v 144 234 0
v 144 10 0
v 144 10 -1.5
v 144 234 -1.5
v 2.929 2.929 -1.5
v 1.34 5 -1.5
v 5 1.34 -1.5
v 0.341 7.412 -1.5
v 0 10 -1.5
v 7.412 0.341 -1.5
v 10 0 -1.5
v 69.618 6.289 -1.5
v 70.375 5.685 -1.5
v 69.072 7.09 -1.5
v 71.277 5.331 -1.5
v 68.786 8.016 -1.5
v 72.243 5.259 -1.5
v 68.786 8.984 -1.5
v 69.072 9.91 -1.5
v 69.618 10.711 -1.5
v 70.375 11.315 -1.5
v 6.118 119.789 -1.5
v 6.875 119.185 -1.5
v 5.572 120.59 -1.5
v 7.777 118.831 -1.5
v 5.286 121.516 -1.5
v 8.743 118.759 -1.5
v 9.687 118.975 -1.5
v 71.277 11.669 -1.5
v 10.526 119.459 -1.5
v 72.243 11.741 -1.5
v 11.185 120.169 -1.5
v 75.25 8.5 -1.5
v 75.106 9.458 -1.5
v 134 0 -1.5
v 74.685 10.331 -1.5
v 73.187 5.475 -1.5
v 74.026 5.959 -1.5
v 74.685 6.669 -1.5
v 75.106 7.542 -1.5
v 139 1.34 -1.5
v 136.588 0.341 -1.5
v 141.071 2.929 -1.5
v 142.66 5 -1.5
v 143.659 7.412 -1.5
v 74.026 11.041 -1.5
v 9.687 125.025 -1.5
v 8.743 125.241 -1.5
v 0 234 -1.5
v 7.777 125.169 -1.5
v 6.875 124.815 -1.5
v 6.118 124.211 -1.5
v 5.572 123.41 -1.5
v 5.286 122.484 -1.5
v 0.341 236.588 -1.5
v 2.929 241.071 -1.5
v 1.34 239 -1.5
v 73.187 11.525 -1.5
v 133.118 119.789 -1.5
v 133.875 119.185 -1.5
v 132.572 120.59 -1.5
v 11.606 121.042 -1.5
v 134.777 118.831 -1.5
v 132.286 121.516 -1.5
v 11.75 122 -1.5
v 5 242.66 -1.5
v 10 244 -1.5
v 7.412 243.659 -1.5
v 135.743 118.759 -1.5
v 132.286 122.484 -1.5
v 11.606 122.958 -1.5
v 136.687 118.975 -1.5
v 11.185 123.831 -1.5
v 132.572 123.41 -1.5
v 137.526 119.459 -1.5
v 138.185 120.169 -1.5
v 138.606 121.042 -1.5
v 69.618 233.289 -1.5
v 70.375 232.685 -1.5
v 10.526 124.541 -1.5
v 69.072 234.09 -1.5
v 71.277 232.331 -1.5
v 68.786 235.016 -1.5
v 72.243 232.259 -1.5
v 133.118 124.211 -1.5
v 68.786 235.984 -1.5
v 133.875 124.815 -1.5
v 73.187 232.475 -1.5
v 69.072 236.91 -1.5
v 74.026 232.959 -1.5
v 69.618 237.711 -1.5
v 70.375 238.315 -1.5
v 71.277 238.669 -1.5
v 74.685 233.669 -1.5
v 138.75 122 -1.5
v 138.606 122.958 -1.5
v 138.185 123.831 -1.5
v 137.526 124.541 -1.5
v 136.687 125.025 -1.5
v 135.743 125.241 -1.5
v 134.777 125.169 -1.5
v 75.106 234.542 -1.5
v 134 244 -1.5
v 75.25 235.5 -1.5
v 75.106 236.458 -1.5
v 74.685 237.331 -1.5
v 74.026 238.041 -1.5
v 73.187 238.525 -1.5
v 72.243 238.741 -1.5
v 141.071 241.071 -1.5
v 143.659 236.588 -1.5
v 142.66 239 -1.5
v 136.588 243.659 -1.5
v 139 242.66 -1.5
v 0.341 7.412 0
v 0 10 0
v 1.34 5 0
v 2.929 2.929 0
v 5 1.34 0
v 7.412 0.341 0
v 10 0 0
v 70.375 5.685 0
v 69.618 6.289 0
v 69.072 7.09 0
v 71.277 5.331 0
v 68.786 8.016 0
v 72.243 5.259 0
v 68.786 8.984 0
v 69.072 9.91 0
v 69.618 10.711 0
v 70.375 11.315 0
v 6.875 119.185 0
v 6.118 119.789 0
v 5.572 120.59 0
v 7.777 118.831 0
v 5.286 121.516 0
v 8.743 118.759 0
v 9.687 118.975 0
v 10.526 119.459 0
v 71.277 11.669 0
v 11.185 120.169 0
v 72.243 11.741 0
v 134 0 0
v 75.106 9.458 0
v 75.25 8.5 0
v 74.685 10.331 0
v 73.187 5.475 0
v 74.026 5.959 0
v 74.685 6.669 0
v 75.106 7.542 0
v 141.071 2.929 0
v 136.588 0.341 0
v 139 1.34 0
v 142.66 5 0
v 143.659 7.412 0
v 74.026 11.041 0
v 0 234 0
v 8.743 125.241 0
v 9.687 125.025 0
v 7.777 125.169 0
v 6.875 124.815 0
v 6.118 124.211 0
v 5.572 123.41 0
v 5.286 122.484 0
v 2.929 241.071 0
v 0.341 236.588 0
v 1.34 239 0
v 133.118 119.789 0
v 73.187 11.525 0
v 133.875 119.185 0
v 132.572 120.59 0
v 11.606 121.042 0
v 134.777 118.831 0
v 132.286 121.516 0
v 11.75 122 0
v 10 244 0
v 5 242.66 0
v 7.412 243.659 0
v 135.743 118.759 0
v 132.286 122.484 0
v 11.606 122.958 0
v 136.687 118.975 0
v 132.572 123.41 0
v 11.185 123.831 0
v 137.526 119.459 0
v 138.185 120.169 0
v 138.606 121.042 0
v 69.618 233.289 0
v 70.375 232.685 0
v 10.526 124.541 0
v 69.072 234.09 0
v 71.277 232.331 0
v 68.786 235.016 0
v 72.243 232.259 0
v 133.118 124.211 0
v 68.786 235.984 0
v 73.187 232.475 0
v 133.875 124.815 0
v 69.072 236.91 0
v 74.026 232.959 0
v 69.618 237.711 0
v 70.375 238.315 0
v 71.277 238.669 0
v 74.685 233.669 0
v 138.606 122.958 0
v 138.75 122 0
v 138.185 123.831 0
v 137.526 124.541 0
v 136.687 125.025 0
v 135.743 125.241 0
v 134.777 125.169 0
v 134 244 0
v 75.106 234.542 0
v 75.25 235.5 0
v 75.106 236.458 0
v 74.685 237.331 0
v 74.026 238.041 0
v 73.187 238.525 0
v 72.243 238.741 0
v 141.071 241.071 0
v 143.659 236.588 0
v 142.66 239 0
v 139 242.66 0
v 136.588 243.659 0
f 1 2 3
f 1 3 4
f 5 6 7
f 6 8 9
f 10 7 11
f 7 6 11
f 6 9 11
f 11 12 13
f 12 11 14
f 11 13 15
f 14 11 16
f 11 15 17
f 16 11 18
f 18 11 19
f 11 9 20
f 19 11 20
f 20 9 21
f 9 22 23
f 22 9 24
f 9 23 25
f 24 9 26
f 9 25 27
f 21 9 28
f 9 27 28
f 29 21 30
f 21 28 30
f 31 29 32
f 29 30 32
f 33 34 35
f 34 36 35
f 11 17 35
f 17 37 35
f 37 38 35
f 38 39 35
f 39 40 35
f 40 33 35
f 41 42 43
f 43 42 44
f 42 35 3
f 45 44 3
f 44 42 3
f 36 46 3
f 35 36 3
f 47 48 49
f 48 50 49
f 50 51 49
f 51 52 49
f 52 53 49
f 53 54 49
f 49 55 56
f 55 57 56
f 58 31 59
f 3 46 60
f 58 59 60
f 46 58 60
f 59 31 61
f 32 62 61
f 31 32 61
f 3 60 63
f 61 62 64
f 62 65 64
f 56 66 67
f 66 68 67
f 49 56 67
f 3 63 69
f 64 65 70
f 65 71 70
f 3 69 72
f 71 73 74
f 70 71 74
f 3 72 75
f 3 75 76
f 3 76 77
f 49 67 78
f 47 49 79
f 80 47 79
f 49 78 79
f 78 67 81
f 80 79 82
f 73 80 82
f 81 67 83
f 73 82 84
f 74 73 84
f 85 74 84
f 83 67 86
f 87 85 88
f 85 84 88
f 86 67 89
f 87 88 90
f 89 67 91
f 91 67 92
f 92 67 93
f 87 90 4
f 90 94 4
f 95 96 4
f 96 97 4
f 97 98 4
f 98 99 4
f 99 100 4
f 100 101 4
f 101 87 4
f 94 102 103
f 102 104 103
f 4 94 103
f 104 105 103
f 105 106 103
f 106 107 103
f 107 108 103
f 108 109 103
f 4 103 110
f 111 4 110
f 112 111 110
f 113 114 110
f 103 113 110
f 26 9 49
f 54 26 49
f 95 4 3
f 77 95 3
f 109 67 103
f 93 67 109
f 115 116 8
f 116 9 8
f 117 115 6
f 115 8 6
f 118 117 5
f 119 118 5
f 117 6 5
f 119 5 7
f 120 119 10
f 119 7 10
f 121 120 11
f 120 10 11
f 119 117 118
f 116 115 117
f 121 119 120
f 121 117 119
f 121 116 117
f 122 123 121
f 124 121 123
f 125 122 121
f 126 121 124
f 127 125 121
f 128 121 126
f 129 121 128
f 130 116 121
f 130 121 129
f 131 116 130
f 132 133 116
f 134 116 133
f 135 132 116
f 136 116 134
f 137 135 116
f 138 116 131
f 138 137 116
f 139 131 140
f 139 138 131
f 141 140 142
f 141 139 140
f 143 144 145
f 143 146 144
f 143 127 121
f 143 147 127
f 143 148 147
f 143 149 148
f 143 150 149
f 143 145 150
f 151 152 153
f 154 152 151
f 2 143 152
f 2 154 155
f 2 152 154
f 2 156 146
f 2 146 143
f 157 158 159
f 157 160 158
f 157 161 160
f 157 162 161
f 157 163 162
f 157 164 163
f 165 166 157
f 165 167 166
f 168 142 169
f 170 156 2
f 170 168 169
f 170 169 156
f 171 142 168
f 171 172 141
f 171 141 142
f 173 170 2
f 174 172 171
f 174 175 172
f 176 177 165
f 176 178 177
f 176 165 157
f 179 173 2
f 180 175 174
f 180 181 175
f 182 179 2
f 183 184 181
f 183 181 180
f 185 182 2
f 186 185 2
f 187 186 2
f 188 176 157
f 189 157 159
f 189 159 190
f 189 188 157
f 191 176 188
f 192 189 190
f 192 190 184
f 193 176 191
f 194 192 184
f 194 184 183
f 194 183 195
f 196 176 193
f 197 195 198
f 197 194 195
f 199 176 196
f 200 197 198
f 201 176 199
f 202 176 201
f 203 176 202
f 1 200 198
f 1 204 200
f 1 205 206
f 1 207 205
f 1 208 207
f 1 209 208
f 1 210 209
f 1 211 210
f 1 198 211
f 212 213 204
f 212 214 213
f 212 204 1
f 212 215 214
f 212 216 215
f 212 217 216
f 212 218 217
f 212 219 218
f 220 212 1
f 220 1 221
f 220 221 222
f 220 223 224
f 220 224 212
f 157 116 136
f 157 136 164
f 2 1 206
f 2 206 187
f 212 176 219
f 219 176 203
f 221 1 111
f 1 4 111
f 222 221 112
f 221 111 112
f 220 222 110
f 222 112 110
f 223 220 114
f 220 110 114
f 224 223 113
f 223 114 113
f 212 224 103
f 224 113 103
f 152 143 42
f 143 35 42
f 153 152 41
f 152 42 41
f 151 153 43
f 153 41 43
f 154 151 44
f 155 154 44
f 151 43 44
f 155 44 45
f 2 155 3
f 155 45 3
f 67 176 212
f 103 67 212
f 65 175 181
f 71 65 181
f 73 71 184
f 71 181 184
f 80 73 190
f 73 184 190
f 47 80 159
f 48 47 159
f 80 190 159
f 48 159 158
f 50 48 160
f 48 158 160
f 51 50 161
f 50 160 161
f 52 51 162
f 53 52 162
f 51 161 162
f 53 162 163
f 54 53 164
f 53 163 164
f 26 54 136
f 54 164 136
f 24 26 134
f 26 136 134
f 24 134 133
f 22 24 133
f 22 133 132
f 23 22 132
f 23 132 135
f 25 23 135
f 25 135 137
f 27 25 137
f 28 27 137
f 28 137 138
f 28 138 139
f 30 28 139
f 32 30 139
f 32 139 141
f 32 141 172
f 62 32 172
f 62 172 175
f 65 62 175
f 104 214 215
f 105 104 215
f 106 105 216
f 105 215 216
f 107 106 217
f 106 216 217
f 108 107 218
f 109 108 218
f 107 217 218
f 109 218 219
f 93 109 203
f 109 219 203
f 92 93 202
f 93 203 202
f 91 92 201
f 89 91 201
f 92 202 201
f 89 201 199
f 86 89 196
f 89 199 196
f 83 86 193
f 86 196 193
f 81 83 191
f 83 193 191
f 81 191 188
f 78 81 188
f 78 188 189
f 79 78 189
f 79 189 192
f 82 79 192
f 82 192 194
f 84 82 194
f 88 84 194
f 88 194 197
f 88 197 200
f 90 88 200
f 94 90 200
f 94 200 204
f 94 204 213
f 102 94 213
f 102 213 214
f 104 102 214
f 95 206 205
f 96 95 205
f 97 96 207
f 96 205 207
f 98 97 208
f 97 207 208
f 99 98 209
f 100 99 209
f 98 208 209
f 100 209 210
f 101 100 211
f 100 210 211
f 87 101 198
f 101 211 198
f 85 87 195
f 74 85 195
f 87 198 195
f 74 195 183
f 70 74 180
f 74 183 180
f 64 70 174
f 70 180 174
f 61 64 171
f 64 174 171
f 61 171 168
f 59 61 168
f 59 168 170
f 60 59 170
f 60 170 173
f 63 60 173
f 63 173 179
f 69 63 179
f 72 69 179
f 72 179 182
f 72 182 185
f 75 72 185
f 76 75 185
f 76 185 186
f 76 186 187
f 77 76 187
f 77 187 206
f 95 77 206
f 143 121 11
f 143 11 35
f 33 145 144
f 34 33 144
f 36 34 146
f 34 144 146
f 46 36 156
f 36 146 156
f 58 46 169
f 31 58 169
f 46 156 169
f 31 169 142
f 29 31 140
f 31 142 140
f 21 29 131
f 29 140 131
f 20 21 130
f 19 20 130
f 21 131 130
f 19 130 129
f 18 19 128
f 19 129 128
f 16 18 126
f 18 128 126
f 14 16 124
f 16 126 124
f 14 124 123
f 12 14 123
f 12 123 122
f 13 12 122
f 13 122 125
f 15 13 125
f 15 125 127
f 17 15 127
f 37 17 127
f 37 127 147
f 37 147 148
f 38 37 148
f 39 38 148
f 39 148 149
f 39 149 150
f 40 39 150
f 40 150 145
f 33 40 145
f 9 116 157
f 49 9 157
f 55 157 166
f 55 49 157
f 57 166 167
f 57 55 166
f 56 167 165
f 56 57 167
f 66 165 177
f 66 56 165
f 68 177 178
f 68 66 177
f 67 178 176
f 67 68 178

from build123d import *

# Parameters (mm, degrees)
SKETCH1_W          = 144
SKETCH1_H          = 244
BASE_FLANGE1_DEPTH = 1.5
FILLET1_R          = 10
SKETCH6_R          = 3.25
CUT_EXTRUDE1_DEPTH = 10


# Sheet-metal steps are written as plain solids
with BuildPart() as part:
    # Sketch1 → Base-Flange1 (new body)
    with BuildSketch(Plane.XY):
        with Locations((72, 122)):
            Rectangle(SKETCH1_W, SKETCH1_H)
    extrude(amount=-BASE_FLANGE1_DEPTH)

    # Fillet1
    fillet1_edges = [part.edges().sort_by_distance(p)[0] for p in [
        (0, 244, -0.75),
        (144, 244, -0.75),
        (144, 0, -0.75),
        (0, 0, -0.75),
    ]]
    fillet(fillet1_edges, radius=FILLET1_R)

    # Sketch6 → Cut-Extrude1 (cut)
    with BuildSketch(Plane.XY):
        with Locations((72, 235.5)):
            Circle(SKETCH6_R)
        with Locations((72, 8.5)):
            Circle(SKETCH6_R)
        with Locations((8.5, 122)):
            Circle(SKETCH6_R)
        with Locations((135.5, 122)):
            Circle(SKETCH6_R)
    extrude(amount=-CUT_EXTRUDE1_DEPTH, mode=Mode.SUBTRACT)


solid = part.part
